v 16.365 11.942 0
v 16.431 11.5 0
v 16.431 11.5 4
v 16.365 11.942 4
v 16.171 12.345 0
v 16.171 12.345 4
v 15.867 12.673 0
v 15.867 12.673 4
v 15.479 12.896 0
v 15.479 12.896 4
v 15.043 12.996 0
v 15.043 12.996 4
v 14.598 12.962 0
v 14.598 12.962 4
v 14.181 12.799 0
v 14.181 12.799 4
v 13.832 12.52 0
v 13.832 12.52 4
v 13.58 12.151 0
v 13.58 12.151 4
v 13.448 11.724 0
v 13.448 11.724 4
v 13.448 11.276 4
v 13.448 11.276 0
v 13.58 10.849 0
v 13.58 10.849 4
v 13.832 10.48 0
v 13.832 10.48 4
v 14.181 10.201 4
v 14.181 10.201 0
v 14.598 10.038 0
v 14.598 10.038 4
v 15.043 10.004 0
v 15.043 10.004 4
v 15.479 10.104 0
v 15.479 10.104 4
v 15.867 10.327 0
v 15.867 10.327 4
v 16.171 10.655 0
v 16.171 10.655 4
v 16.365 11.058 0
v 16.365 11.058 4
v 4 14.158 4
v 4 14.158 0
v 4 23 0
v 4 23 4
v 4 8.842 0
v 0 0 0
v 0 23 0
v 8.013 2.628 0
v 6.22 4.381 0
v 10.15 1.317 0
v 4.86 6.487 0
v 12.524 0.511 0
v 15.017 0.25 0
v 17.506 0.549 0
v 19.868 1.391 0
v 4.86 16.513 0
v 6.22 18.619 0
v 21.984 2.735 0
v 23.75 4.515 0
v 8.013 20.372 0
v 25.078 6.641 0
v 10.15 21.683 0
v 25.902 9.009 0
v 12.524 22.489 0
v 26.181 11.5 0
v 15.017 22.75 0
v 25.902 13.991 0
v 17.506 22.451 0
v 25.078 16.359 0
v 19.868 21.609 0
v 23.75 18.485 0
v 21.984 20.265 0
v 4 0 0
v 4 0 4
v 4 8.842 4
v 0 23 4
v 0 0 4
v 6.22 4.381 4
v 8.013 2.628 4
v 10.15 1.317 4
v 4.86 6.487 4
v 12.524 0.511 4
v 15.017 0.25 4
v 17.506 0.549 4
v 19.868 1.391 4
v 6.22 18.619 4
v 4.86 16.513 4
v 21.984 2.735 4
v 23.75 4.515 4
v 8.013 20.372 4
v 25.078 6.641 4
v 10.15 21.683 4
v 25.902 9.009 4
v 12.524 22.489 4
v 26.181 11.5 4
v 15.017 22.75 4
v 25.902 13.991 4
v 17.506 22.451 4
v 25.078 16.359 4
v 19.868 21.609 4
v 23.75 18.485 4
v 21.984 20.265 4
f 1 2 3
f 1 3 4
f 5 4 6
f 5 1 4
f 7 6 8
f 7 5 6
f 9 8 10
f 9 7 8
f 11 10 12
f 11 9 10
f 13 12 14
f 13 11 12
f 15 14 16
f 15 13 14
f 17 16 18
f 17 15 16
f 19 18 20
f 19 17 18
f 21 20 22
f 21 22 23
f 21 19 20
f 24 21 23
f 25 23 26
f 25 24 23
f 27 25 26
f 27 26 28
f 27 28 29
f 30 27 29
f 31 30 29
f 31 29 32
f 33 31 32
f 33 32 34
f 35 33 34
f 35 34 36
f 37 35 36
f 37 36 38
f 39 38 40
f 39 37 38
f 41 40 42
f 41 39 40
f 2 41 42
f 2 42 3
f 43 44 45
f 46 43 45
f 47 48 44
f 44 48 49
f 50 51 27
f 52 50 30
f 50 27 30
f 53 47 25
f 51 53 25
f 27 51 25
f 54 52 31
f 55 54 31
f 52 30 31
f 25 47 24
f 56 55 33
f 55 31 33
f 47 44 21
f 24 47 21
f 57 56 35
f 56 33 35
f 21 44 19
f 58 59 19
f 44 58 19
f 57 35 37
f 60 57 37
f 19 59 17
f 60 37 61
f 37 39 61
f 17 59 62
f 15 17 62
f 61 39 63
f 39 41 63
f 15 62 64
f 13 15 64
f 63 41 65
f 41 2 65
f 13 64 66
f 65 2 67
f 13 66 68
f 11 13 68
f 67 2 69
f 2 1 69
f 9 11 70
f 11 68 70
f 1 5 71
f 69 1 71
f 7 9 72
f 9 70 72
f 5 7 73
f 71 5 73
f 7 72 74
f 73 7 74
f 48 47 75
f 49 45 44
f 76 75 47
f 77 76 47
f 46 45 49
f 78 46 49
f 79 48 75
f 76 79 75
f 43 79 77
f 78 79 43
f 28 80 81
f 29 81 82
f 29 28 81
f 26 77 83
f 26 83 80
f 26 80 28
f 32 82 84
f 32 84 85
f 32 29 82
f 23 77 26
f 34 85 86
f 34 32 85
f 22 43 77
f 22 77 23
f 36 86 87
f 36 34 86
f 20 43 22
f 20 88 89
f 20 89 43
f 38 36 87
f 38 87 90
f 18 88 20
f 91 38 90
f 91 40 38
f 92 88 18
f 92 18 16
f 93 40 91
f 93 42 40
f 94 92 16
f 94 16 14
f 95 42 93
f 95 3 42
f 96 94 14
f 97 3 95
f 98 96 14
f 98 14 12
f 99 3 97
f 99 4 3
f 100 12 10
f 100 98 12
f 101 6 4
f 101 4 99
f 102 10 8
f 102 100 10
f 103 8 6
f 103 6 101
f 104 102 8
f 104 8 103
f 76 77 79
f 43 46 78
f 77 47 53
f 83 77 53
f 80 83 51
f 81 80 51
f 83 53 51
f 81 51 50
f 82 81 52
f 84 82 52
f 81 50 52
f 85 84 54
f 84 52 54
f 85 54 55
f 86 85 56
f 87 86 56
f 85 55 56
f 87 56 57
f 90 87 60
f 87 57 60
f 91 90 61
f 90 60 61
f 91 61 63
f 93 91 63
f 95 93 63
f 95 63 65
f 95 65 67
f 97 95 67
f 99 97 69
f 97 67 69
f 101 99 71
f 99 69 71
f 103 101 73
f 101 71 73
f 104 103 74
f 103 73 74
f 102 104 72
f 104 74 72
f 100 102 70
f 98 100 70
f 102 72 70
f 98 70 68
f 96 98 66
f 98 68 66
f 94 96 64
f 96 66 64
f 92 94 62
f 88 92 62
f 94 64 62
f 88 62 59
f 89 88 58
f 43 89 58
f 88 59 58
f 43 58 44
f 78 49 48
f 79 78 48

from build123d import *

# Parameters (mm, degrees)
SKETCH_1_R      = 1.5
EXTRUDE_1_DEPTH = 4


with BuildPart() as part:
    # Эскиз1 → Бобышка-Вытянуть1 (new body)
    with BuildSketch(Plane.XY):
        with BuildLine():
            Line((4, 0), (4, 8.841521673))
            ThreePointArc((4, 8.841521673), (26.181376537, 11.5), (4, 14.158478327))
            Line((4, 14.158478327), (4, 23))
            Line((4, 23), (0, 23))
            Line((0, 23), (0, 0))
            Line((0, 0), (4, 0))
        make_face()
        with Locations((14.931376537, 11.5)):
            Circle(SKETCH_1_R, mode=Mode.SUBTRACT)
    extrude(amount=EXTRUDE_1_DEPTH)


solid = part.part
